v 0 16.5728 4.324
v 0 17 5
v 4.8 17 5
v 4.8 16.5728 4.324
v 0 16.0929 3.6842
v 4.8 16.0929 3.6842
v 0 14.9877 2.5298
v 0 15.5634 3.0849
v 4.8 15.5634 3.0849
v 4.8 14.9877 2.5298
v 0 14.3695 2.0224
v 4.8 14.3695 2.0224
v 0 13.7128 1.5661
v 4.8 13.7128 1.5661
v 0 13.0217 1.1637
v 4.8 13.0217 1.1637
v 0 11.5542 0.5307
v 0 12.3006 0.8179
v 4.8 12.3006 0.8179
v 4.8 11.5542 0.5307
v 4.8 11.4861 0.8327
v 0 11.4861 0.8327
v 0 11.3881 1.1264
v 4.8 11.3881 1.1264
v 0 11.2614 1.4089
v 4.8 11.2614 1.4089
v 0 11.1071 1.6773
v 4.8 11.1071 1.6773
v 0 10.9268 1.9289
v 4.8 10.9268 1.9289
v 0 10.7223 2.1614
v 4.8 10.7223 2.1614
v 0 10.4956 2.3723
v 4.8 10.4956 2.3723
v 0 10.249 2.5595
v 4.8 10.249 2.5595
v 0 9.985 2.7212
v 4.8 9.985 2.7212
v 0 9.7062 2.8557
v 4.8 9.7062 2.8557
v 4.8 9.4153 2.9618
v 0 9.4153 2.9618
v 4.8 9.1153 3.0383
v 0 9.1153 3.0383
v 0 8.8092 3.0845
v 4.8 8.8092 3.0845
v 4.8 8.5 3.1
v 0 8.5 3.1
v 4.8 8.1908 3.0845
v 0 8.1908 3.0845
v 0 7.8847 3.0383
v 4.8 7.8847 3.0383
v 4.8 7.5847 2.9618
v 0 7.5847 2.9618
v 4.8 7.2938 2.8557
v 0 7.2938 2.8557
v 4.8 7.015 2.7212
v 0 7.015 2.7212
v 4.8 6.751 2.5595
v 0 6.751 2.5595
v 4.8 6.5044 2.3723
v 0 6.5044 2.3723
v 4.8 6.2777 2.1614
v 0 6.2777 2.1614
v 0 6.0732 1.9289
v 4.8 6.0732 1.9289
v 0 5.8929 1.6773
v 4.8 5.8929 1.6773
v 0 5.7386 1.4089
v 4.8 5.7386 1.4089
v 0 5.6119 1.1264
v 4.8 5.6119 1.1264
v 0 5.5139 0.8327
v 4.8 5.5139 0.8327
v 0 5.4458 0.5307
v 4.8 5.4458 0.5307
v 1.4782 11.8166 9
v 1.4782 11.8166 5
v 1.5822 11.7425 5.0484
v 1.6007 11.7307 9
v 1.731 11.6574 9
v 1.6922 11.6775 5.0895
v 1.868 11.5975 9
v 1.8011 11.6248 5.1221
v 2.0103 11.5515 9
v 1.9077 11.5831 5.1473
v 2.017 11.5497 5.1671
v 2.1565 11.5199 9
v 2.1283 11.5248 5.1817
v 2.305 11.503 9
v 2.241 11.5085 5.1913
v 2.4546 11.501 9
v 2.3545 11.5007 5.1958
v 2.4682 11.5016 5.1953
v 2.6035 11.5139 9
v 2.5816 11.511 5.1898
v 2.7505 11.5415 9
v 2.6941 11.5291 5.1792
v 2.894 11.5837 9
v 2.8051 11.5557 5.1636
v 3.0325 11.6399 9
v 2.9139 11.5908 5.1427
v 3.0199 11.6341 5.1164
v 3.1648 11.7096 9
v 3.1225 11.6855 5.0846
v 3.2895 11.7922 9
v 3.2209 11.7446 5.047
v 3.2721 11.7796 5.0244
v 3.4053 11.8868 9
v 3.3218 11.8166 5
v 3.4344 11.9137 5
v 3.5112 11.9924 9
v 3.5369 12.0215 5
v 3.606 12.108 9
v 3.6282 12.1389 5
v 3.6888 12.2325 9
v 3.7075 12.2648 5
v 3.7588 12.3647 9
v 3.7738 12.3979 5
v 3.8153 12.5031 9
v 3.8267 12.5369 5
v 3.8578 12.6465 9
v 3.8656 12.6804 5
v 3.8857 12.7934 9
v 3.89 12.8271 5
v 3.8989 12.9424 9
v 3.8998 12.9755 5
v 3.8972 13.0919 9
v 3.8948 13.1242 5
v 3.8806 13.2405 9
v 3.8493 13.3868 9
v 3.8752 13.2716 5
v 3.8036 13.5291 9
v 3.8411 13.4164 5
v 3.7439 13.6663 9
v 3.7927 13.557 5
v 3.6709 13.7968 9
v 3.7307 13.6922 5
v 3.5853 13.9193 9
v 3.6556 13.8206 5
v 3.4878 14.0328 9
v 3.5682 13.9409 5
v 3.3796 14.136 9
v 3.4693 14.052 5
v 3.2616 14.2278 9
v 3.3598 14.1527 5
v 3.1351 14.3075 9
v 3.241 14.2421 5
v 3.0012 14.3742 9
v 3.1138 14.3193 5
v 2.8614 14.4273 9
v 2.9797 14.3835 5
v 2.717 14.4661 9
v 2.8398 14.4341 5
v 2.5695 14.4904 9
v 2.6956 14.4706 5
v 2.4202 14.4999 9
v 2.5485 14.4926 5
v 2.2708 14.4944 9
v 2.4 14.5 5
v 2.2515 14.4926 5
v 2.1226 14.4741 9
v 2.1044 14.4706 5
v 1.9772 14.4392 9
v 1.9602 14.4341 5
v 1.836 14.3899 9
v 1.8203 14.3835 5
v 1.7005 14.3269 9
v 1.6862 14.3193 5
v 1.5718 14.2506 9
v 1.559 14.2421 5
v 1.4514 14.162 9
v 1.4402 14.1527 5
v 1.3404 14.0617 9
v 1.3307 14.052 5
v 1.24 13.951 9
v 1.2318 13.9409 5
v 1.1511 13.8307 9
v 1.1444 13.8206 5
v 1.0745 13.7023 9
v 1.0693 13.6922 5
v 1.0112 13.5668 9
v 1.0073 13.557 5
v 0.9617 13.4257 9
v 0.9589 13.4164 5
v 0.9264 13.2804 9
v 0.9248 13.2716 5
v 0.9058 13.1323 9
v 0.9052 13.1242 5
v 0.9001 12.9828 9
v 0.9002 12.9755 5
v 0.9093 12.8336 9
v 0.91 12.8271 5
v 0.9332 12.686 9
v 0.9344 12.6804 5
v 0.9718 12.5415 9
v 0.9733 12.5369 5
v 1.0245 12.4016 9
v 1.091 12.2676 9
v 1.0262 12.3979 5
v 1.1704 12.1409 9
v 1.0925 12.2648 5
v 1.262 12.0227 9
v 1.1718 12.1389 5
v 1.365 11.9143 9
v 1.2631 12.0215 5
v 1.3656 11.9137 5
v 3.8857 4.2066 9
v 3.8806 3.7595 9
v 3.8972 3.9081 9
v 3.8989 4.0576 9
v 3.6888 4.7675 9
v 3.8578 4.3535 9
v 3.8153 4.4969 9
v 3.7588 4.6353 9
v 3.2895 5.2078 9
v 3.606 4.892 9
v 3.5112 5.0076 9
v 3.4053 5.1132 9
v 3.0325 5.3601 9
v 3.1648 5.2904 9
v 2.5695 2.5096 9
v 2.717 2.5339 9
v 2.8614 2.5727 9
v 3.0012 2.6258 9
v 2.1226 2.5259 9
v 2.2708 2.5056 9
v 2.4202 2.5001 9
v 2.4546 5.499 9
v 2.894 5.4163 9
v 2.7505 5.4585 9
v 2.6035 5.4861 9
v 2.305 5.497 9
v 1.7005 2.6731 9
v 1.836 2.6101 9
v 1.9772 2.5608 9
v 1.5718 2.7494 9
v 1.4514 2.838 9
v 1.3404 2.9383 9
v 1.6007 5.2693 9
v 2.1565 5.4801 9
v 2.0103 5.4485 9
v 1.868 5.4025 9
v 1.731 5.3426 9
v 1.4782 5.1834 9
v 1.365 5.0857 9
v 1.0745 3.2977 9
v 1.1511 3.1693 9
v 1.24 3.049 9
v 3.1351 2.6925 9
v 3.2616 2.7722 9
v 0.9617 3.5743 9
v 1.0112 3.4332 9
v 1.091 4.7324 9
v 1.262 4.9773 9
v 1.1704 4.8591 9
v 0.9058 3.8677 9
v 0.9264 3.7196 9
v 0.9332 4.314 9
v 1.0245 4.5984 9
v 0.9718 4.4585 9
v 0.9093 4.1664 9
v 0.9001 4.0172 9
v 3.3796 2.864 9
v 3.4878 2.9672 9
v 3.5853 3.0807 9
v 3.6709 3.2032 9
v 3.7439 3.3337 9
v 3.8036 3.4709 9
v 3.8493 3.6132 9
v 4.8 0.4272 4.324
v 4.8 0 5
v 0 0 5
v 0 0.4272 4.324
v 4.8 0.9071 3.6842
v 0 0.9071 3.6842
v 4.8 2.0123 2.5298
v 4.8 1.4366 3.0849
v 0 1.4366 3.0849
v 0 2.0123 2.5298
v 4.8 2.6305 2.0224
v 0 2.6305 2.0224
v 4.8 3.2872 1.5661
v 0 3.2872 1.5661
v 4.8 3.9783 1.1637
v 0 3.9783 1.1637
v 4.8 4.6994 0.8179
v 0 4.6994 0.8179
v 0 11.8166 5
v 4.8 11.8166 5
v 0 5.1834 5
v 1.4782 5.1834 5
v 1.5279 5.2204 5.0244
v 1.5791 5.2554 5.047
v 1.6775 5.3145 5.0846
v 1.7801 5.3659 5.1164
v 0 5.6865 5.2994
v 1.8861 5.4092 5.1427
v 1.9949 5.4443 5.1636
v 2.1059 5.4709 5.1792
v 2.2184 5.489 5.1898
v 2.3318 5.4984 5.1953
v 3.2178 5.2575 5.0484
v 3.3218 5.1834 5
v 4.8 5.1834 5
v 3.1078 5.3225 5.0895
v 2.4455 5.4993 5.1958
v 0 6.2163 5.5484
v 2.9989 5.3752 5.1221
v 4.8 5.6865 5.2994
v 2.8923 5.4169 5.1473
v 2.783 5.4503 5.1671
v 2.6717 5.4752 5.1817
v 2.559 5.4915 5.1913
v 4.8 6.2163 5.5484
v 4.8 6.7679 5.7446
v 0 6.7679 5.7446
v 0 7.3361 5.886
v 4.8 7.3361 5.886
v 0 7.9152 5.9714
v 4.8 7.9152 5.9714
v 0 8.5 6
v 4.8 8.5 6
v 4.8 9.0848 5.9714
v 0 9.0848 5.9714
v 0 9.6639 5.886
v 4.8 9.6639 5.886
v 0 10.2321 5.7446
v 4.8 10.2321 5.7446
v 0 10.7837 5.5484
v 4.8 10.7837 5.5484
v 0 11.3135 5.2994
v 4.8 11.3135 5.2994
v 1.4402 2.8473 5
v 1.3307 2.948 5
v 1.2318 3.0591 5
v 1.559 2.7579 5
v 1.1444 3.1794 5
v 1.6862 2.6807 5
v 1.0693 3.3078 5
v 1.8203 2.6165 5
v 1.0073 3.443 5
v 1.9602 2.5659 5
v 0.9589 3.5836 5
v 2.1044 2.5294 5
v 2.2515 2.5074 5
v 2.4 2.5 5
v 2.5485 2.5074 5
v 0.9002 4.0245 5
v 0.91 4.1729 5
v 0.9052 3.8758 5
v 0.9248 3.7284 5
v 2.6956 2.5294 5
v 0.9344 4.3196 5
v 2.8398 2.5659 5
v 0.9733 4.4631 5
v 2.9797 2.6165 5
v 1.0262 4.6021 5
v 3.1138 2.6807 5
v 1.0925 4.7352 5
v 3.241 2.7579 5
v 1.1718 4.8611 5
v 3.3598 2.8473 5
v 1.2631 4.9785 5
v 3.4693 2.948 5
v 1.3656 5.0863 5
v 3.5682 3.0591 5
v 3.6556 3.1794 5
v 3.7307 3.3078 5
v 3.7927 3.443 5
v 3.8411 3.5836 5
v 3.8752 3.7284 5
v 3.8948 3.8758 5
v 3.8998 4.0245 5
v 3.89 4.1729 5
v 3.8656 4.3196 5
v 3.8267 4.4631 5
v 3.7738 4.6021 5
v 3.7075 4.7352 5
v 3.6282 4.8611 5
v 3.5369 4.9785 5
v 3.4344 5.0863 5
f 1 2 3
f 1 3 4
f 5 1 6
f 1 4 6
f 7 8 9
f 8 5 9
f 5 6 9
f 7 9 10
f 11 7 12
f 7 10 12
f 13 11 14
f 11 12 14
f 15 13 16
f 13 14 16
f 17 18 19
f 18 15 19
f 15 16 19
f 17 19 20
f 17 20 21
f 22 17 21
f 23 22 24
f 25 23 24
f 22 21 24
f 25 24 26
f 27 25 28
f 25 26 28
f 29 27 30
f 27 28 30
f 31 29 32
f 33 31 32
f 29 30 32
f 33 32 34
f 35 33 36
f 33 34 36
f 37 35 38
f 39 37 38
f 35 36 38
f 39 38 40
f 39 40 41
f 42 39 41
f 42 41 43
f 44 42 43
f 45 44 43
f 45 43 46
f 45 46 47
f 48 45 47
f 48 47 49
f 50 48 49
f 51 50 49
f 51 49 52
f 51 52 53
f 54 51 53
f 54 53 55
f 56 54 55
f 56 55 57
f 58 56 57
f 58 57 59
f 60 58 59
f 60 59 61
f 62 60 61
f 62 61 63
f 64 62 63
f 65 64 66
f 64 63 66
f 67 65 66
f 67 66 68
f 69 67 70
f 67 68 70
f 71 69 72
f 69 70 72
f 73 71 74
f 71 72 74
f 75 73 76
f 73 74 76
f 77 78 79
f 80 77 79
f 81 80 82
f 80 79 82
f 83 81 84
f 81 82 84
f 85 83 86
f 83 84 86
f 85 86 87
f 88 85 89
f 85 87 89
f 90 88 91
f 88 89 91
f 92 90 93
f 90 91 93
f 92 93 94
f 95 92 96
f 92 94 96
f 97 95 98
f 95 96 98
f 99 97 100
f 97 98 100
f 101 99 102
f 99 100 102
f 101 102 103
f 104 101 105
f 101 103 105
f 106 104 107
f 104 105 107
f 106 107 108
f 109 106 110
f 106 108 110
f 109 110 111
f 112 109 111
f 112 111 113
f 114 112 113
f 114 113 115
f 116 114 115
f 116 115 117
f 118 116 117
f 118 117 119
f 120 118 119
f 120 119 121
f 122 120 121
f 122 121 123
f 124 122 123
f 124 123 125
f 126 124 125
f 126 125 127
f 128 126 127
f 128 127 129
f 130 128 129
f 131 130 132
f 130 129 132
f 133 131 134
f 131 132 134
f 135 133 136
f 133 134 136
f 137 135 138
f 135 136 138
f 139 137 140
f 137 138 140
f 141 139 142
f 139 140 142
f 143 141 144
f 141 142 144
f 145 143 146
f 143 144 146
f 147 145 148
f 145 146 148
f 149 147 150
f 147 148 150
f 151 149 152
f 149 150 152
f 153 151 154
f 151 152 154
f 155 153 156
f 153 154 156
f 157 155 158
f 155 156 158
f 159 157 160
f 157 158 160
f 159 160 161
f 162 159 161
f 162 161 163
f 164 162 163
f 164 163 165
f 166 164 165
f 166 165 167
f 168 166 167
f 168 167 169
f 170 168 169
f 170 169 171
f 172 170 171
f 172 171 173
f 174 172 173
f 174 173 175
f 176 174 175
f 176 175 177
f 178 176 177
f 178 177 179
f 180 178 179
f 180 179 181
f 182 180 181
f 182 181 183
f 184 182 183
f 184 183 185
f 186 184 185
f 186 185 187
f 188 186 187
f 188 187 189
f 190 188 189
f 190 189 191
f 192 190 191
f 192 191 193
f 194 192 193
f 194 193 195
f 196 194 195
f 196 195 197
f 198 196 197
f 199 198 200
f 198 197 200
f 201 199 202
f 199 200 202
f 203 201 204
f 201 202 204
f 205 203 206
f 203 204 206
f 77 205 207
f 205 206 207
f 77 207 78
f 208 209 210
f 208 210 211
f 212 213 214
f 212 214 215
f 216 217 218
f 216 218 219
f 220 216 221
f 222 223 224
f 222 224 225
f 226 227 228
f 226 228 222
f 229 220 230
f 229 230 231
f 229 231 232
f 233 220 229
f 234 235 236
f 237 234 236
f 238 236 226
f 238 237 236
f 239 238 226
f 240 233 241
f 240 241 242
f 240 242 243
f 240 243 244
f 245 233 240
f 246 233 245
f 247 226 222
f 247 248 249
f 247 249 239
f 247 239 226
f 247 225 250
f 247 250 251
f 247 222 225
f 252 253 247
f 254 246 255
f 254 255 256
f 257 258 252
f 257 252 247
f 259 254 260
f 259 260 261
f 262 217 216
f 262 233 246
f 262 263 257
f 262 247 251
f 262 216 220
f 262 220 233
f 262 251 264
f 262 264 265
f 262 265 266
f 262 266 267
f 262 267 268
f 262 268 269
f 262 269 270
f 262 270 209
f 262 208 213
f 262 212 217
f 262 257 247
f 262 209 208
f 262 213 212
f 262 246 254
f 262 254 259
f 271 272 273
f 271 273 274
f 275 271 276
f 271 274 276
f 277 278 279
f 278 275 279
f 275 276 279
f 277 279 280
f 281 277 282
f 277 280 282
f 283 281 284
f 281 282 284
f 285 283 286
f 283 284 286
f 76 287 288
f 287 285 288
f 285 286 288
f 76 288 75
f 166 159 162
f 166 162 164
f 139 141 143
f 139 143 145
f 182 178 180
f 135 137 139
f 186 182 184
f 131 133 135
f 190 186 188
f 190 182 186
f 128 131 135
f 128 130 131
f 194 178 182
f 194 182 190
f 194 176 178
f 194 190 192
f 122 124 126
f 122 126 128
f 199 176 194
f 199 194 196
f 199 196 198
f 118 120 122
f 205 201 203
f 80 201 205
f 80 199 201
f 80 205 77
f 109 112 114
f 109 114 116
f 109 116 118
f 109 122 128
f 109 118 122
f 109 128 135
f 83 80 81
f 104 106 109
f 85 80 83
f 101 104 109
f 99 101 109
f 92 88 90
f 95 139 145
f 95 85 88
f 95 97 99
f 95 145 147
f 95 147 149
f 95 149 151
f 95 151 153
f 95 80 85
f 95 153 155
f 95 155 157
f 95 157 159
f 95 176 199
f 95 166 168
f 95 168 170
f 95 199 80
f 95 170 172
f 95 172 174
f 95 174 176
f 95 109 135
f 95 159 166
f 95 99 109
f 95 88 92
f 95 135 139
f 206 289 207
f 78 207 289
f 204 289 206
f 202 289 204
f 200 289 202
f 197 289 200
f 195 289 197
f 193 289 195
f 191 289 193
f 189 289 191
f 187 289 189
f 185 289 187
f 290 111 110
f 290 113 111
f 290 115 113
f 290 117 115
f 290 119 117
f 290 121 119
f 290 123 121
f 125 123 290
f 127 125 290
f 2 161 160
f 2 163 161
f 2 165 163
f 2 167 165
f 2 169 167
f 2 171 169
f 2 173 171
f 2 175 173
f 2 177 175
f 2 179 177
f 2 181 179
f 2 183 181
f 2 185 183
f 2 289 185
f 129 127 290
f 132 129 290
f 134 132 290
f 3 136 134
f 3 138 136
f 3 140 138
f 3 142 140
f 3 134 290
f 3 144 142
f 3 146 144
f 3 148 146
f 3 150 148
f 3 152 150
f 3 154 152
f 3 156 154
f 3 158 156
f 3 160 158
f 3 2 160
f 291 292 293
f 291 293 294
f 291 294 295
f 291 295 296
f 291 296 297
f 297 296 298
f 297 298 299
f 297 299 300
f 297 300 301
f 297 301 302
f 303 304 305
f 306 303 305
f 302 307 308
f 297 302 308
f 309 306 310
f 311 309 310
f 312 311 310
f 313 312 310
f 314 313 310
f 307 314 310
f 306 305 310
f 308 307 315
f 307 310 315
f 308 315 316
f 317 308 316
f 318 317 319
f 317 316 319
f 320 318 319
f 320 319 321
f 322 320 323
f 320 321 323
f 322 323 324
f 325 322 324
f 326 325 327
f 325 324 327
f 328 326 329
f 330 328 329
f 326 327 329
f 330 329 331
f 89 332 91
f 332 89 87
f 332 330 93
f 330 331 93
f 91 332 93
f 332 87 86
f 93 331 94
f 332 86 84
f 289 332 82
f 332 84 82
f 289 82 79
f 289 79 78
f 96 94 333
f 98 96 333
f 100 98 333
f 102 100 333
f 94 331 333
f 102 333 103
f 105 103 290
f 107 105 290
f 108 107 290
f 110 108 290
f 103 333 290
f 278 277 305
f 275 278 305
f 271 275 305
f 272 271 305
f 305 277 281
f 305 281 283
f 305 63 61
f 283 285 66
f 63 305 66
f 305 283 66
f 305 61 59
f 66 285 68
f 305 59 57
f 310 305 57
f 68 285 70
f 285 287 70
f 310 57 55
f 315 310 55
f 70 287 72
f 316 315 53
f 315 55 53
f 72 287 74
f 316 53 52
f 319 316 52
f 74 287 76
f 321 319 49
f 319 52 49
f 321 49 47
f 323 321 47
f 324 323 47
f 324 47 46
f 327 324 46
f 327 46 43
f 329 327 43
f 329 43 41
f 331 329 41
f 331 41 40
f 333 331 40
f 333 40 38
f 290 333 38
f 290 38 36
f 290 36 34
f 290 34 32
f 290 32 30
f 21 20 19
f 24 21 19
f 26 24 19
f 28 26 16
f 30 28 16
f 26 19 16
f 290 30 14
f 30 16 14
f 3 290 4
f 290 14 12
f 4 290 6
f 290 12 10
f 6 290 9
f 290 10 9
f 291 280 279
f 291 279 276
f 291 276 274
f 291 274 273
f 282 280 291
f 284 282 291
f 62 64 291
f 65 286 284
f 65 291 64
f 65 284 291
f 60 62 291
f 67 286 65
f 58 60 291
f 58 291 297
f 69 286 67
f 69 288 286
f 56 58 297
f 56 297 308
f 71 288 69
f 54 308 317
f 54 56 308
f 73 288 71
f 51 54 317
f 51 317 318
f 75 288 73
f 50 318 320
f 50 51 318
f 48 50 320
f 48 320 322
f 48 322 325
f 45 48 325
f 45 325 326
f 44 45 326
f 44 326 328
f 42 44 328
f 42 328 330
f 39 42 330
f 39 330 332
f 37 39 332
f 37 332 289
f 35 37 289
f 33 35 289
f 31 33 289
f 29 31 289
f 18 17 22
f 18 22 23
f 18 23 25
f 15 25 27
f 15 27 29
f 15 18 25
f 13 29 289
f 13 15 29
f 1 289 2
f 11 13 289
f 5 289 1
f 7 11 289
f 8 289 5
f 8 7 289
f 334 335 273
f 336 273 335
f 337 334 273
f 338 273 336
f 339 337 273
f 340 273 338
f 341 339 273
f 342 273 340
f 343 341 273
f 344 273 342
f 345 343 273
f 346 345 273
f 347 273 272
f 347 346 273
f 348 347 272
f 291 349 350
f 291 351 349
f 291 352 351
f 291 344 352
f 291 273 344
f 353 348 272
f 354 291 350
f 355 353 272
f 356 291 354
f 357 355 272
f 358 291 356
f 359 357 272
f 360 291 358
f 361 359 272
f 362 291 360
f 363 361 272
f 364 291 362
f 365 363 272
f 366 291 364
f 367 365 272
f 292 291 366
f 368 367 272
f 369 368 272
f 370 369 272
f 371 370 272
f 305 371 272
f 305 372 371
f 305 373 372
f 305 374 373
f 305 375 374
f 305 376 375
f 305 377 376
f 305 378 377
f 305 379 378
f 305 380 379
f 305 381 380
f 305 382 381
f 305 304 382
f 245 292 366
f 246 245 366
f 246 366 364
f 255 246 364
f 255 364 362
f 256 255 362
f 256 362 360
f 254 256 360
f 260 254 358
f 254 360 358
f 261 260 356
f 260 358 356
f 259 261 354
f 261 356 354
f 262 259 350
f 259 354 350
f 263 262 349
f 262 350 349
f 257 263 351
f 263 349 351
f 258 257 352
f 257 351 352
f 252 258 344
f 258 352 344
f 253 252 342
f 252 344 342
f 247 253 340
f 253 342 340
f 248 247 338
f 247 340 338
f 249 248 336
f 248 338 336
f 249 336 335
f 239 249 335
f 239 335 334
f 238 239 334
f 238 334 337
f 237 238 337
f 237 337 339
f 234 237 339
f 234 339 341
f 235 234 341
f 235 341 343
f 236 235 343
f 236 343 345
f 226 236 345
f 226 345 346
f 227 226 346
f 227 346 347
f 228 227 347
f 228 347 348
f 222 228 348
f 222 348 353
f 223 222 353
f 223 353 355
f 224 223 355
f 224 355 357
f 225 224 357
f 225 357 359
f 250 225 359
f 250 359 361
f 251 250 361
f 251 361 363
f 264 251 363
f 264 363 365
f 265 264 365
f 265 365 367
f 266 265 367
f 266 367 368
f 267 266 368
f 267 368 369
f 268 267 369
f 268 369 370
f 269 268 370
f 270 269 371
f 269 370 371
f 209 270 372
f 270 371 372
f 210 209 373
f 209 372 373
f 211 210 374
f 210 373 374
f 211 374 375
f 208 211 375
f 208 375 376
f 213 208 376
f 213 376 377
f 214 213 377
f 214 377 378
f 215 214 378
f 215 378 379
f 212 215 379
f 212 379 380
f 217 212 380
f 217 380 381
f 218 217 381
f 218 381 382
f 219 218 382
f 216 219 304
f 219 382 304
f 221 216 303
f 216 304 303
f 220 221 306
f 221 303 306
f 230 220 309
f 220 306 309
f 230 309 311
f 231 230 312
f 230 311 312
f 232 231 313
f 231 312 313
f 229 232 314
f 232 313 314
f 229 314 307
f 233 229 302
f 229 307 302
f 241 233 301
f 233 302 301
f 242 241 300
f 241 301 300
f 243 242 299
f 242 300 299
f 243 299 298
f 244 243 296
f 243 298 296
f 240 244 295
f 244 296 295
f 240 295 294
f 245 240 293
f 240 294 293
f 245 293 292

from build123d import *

# Parameters (mm, degrees)
SKETCH_1_W          = 4.8
SKETCH_1_H          = 17
EXTRUDE_1_DEPTH     = 5
SKETCH_2_R          = 3.1
CUT_EXTRUDE_1_DEPTH = 19.358649188
EXTRUDE_2_DEPTH     = 4.8
FILLET_1_R          = 10
SKETCH_4_R          = 1.5
EXTRUDE_3_DEPTH     = 4


with BuildPart() as part:
    # 草图1 → 凸台-拉伸1 (new body)
    with BuildSketch(Plane.XY):
        with Locations((2.4, 8.5)):
            Rectangle(SKETCH_1_W, SKETCH_1_H)
    extrude(amount=EXTRUDE_1_DEPTH)

    # 草图2 → 切除-拉伸1 (cut, through all)
    with BuildSketch(Plane(origin=(4.8, 0, 0), x_dir=(0, 0, -1), z_dir=(1, 0, 0))):
        with Locations((0, 8.5)):
            Circle(SKETCH_2_R)
    extrude(amount=-CUT_EXTRUDE_1_DEPTH, mode=Mode.SUBTRACT)

    # 草图3 → 凸台-拉伸2 (add)
    with BuildSketch(Plane(origin=(4.8, 0, 0), x_dir=(0, 0, -1), z_dir=(1, 0, 0))):
        with BuildLine():
            Line((-5, 11.81662479), (-5, 5.18337521))
            ThreePointArc((-5, 5.18337521), (-6, 8.5), (-5, 11.81662479))
        make_face()
    extrude(amount=-EXTRUDE_2_DEPTH)

    # 圆角1
    # the kernel refuses this fillet: 10 mm, written as the material it takes off along each edge
    with BuildSketch(Plane(origin=(-21.650635095, 0, 0), x_dir=(0, 0, 1), z_dir=(1, 0, 0))) as fillet_1_piece_1:
        with BuildLine():
            CenterArc((10, -8.660254038), FILLET_1_R, 120, 60)
            Line((0, -8.660254038), (0, 0))
            Line((0, 0), (5, 0))
        make_face()
    extrude(amount=48.101270189, mode=Mode.SUBTRACT)
    with BuildSketch(Plane(origin=(26.450635095, 17, 0), x_dir=(0, -1, 0), z_dir=(-1, 0, 0))) as fillet_1_piece_2:
        with BuildLine():
            CenterArc((8.660254038, 10), FILLET_1_R, 210, 60)
            Line((0, 5), (0, 0))
            Line((0, 0), (8.660254038, 0))
        make_face()
    extrude(amount=48.101270189, mode=Mode.SUBTRACT)

    # 草图4 → 凸台-拉伸3 (add)
    with BuildSketch(Plane.XY.offset(5)):
        with Locations(Location((2.4, 13, 0), (0, 0, 232.08440029))):
            Circle(SKETCH_4_R)
        with Locations(Location((2.4, 4, 0), (0, 0, 127.91559971))):
            Circle(SKETCH_4_R)
    extrude(amount=EXTRUDE_3_DEPTH)


solid = part.part
